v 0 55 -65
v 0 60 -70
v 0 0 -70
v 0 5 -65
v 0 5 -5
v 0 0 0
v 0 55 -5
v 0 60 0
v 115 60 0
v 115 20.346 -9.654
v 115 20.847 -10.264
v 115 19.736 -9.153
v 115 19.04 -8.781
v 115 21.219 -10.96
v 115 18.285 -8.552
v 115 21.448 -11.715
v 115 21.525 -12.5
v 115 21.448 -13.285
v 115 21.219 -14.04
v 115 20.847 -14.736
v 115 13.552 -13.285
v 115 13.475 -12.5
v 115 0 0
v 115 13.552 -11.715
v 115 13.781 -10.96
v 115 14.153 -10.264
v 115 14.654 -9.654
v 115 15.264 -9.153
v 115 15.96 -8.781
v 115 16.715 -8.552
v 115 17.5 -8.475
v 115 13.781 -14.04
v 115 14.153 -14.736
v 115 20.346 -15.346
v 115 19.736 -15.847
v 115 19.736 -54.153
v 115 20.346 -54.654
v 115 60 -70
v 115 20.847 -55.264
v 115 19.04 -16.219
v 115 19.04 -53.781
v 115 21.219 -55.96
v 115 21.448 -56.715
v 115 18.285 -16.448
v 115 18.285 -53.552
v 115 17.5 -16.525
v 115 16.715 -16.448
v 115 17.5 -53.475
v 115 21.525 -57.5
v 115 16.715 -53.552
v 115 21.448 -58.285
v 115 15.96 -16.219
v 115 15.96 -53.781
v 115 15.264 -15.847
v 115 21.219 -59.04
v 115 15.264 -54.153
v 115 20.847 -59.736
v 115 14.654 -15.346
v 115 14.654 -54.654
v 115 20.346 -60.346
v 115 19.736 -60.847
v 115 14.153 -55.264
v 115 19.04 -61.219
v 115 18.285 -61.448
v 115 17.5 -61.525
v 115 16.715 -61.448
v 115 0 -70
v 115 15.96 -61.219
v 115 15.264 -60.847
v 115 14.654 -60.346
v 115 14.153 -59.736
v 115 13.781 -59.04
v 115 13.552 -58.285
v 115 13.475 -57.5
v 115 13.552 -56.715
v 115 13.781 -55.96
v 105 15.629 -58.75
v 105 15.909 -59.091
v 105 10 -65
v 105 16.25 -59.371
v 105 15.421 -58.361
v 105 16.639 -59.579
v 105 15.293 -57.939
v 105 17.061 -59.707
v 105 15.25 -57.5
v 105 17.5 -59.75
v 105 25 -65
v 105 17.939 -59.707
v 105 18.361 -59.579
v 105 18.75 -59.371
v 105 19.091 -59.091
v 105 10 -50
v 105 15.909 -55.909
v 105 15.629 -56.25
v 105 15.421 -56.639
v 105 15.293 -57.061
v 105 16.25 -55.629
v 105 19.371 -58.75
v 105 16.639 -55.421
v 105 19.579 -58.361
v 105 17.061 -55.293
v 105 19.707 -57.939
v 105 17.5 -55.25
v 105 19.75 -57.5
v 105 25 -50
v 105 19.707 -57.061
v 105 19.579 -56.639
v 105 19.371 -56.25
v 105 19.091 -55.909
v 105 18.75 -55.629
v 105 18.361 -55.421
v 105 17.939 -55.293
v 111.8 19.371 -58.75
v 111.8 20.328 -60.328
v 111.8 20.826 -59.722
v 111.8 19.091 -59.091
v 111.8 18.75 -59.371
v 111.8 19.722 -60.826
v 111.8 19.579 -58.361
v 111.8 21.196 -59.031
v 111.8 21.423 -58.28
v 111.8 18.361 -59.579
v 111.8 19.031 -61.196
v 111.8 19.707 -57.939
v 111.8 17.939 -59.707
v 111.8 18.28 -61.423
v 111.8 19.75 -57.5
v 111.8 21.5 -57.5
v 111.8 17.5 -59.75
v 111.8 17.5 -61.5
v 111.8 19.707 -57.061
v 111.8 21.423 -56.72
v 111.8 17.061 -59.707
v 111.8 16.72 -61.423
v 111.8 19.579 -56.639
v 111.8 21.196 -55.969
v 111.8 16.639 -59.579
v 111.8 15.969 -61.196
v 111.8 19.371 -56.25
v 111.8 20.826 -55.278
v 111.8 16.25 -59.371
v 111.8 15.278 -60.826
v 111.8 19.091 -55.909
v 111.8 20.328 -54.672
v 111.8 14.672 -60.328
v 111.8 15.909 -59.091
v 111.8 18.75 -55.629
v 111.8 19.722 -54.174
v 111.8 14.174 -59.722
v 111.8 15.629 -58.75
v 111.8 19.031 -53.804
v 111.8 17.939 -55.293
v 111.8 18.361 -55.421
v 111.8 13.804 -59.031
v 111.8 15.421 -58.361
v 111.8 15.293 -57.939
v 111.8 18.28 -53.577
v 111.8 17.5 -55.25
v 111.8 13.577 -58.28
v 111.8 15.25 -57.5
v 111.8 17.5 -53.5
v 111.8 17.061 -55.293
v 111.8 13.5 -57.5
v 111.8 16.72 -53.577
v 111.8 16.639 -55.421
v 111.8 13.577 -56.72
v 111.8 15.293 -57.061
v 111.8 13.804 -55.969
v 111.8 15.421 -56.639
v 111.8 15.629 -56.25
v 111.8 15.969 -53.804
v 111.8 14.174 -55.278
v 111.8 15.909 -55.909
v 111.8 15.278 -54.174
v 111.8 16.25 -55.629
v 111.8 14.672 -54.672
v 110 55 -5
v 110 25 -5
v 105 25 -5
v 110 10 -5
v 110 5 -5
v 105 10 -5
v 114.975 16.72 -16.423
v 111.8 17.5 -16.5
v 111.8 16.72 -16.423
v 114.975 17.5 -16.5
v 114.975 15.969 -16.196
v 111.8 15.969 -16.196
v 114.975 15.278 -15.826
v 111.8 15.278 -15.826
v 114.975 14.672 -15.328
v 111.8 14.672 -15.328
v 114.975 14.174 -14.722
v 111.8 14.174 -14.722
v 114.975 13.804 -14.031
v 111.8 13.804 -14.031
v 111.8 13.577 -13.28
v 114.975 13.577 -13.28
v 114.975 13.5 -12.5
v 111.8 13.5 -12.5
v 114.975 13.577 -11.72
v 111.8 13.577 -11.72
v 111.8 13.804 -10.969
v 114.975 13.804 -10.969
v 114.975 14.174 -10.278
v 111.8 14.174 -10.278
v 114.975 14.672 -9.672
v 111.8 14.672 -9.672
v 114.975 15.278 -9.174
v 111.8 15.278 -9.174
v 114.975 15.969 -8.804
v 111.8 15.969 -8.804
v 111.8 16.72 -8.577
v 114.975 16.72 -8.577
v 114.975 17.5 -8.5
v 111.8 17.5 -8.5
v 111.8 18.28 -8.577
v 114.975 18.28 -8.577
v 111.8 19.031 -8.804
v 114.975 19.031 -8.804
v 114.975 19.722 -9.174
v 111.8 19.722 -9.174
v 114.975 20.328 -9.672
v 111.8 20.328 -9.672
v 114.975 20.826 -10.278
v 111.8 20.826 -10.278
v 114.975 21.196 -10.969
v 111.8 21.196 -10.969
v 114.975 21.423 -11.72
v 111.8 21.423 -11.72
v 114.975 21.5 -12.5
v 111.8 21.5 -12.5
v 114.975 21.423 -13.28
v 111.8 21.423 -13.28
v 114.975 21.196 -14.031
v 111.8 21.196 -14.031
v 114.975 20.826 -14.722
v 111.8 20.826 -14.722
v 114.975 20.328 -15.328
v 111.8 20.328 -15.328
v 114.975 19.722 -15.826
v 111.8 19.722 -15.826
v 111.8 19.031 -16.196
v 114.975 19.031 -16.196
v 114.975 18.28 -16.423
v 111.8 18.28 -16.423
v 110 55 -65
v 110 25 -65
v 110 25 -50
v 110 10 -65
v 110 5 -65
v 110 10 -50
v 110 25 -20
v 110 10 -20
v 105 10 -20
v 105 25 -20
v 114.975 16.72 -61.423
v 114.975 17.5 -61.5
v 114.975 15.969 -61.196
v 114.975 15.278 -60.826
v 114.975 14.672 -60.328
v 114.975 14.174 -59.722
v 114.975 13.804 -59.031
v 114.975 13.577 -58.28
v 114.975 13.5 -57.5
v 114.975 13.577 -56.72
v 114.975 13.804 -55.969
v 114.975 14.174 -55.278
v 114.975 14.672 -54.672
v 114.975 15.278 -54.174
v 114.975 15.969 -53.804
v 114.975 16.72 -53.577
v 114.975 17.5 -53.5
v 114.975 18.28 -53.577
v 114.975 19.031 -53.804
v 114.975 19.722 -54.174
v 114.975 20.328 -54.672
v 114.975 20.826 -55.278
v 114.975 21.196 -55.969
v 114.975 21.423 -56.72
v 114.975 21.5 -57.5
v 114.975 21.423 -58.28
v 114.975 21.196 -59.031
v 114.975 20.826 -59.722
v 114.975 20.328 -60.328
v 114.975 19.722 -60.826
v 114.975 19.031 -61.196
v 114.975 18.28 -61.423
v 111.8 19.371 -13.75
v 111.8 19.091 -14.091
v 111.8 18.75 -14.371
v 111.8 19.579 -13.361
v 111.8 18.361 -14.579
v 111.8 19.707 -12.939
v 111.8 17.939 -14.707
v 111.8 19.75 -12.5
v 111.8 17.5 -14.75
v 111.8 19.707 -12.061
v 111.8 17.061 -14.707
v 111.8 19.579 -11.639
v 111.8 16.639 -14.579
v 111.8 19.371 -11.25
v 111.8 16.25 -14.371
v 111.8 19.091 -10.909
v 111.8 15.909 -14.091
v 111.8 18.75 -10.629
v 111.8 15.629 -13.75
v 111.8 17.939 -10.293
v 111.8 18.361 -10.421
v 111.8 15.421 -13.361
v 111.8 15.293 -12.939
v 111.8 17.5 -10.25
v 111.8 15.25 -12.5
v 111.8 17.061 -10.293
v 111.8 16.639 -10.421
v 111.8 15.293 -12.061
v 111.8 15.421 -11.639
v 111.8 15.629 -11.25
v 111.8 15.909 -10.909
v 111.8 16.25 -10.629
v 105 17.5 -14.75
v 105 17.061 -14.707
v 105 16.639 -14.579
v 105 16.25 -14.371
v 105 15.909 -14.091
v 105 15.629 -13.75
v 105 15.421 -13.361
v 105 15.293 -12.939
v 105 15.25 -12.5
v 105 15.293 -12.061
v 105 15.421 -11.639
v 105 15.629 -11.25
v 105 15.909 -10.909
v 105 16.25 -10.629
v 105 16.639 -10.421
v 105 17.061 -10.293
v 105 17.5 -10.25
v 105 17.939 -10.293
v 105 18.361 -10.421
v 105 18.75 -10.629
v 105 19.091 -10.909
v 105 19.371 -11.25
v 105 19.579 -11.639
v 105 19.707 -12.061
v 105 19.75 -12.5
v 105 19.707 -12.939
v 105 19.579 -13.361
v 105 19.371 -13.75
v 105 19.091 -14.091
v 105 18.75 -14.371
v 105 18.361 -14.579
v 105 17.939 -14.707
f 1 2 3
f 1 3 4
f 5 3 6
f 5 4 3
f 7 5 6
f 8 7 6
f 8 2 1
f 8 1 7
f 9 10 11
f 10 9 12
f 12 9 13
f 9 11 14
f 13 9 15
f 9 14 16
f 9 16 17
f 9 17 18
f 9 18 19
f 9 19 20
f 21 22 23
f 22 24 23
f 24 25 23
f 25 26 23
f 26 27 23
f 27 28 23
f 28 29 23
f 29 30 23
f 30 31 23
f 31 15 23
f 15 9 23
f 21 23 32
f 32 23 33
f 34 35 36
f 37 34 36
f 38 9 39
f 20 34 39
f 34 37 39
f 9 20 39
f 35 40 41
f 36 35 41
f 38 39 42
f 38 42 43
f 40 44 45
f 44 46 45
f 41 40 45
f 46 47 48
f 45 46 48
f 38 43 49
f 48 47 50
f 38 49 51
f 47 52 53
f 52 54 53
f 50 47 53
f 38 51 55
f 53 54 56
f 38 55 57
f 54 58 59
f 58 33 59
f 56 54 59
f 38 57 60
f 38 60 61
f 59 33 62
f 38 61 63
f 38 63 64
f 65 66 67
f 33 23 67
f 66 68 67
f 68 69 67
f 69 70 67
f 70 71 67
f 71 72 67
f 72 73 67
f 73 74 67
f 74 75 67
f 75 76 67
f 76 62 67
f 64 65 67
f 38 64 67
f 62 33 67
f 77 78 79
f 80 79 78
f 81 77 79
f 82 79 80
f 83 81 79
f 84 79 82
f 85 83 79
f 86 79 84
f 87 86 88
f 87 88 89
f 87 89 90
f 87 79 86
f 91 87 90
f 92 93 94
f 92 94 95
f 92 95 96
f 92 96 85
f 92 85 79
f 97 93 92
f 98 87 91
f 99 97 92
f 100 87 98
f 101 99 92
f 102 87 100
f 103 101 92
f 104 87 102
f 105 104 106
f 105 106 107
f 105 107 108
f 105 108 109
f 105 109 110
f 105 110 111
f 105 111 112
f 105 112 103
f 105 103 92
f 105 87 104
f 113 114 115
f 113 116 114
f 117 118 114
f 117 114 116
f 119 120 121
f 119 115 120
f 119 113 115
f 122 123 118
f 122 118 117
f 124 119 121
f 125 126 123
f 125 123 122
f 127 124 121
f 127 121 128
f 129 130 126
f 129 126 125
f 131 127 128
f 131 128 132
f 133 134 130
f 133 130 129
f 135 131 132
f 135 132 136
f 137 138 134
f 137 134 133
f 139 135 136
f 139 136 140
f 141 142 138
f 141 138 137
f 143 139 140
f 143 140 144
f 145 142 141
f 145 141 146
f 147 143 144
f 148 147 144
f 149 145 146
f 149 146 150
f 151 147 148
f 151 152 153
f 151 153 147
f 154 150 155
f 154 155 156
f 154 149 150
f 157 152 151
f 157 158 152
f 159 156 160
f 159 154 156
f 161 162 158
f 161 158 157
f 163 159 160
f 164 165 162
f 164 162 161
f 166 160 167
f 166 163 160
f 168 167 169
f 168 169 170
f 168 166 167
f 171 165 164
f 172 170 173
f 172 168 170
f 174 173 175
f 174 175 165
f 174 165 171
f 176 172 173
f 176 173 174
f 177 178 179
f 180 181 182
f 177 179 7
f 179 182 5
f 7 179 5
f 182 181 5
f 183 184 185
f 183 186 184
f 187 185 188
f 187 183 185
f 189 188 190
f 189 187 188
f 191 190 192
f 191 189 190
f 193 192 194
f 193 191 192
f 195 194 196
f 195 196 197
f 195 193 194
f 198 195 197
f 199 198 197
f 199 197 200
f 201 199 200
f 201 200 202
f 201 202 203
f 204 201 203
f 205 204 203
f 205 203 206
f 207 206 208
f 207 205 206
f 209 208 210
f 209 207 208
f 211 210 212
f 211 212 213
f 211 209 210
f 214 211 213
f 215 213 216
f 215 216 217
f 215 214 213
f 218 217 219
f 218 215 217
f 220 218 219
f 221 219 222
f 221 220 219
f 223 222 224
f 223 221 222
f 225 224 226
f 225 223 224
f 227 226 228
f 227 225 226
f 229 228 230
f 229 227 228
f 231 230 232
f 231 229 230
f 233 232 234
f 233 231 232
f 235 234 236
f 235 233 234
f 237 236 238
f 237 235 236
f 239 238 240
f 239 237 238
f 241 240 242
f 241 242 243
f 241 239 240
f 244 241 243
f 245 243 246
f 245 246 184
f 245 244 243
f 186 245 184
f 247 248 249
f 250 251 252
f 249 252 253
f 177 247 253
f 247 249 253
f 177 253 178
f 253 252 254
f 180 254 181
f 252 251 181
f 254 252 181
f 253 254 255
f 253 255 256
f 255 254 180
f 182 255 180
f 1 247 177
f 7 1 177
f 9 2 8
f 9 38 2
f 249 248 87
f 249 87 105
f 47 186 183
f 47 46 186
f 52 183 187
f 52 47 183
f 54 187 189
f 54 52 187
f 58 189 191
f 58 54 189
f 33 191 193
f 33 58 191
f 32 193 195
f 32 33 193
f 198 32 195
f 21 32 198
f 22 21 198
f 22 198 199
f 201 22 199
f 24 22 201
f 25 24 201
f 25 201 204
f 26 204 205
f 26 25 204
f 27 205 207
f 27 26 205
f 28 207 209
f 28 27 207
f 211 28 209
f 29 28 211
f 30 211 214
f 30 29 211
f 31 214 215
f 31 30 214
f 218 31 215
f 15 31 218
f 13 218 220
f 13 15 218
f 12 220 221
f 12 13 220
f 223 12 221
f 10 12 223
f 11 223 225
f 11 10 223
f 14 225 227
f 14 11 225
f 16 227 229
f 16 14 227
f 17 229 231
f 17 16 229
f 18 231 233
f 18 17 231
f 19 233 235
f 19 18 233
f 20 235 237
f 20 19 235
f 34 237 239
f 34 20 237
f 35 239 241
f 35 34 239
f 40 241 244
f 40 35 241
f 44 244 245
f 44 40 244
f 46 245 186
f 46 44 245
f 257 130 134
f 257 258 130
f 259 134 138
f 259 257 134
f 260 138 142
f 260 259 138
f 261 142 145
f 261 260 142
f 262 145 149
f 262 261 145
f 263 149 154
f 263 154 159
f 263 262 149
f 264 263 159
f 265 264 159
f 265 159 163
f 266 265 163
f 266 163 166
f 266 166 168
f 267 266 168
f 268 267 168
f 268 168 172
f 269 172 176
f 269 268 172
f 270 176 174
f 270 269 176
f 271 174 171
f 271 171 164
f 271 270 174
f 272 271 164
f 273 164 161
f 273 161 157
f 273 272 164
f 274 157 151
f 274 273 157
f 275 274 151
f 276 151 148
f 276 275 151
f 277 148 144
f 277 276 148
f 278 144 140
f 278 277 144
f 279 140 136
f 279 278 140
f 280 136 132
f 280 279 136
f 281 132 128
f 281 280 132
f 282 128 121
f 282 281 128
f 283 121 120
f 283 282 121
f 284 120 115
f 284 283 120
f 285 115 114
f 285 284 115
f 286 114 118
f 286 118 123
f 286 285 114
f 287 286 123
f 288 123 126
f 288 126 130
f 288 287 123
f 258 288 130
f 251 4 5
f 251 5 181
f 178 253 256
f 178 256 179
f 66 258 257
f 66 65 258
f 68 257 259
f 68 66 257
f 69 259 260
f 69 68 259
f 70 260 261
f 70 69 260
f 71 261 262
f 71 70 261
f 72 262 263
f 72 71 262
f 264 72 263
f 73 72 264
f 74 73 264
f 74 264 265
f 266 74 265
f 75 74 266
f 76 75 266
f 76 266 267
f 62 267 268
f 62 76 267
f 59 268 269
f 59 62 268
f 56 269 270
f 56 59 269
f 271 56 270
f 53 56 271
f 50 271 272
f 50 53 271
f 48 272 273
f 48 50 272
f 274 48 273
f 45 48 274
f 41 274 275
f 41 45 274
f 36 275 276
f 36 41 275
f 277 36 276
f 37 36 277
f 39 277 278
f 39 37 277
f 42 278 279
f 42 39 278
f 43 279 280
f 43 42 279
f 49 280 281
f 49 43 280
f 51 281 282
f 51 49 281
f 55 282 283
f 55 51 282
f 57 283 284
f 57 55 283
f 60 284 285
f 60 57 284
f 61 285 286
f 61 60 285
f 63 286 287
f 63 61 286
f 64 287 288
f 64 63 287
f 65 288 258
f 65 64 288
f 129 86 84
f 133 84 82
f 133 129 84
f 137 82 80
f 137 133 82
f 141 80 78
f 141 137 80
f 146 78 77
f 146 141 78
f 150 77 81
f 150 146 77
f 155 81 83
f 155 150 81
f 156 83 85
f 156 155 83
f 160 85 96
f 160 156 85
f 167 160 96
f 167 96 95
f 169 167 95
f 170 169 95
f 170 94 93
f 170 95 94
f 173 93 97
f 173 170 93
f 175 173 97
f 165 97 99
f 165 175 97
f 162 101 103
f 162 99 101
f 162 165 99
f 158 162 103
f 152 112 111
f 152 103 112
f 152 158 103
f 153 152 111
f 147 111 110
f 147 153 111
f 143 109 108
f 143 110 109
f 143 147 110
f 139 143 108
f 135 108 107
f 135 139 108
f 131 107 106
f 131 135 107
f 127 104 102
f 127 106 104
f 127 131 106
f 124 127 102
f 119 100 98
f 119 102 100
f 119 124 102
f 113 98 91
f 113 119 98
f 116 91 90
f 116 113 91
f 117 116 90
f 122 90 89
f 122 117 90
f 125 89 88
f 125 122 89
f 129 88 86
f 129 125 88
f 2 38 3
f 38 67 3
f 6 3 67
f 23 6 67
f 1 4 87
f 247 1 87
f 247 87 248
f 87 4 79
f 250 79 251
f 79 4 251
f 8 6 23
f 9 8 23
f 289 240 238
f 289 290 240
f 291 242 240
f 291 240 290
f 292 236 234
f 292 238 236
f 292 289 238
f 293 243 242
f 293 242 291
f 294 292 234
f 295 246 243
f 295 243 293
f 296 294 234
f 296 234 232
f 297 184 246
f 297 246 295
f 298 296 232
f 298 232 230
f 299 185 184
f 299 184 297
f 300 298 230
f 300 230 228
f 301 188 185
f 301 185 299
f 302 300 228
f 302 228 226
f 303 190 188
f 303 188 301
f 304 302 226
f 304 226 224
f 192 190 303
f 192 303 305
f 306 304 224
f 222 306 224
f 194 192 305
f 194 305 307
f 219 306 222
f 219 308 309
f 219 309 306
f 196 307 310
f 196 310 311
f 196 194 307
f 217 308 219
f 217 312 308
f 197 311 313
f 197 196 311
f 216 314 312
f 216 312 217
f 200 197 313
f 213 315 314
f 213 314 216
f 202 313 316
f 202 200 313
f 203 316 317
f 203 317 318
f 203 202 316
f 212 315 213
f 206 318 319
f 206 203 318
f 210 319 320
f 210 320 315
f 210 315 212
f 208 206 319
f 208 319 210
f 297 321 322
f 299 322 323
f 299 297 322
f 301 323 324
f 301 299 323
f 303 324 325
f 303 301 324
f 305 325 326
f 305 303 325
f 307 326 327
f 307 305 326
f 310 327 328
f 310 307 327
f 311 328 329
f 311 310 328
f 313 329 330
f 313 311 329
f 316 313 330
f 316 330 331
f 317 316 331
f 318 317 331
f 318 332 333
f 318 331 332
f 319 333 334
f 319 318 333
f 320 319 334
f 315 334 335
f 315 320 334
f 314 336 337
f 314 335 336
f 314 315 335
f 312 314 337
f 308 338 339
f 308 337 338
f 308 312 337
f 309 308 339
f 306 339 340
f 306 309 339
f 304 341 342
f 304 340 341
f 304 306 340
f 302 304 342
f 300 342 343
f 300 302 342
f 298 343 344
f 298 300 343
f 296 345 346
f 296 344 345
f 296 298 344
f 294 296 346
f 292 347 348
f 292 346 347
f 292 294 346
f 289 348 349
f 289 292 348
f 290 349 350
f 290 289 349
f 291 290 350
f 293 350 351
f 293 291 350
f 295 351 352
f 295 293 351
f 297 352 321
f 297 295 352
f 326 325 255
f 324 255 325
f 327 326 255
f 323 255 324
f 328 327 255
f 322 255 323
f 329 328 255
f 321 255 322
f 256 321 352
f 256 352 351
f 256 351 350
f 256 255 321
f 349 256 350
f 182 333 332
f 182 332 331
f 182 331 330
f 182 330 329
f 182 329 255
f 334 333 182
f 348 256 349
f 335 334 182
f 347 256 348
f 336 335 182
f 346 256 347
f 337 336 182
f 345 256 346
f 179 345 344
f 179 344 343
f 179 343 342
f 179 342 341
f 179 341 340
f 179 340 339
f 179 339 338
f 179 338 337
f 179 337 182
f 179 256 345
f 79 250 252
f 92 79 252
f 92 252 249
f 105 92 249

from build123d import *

# Parameters (mm, degrees)
CROQUIS1_W                                  = 115
CROQUIS1_H                                  = 70
SALIENTE_EXTRUIR1_DEPTH                     = 5
SALIENTE_EXTRUIR2_DEPTH                     = 55
CROQUIS3_W                                  = 60
CROQUIS3_H                                  = 5
SALIENTE_EXTRUIR3_DEPTH                     = 110
CROQUIS4_W                                  = 15
CROQUIS4_H                                  = 15
SALIENTE_EXTRUIR4_DEPTH                     = 5
REFRENTADO_PARA_TORNILLO_CON_CABEZA_2_COUNT = 2
REFRENTADO_PARA_TORNILLO_CON_CABEZA_2_PITCH = 45


with BuildPart() as part:
    # Croquis1 → Saliente-Extruir1 (new body)
    with BuildSketch(Plane(origin=(0, 0, 0), x_dir=(1, 0, 0), z_dir=(0, 1, 0))):
        with Locations((57.5, 35)):
            Rectangle(CROQUIS1_W, CROQUIS1_H)
    extrude(amount=SALIENTE_EXTRUIR1_DEPTH)

    # Croquis2 → Saliente-Extruir2 (add)
    with BuildSketch(Plane(origin=(0, 5, 0), x_dir=(1, 0, 0), z_dir=(0, 1, 0))):
        Polygon((0, 0), (115, 0), (115, 70), (0, 70), (0, 65), (110, 65), (110, 5), (0, 5), align=None)
    extrude(amount=SALIENTE_EXTRUIR2_DEPTH)

    # Croquis3 → Saliente-Extruir3 (add)
    with BuildSketch(Plane.ZY.offset(-110)):
        with Locations((-35, 57.5)):
            Rectangle(CROQUIS3_W, CROQUIS3_H)
    extrude(amount=SALIENTE_EXTRUIR3_DEPTH)

    # Croquis4 → Saliente-Extruir4 (add)
    with BuildSketch(Plane.ZY.offset(-110)):
        with Locations((-57.5, 17.5)):
            Rectangle(CROQUIS4_W, CROQUIS4_H)
        with Locations((-12.5, 17.5)):
            Rectangle(CROQUIS4_W, CROQUIS4_H)
    extrude(amount=SALIENTE_EXTRUIR4_DEPTH)

    # Croquis7 → Refrentado para tornillo con cabeza hueca de M41 (revolve, cut)
    with BuildSketch(Plane(origin=(115, 17.5, -12.5), x_dir=(0, 0, -1), z_dir=(0, 1, 0))):
        Polygon((0, 0), (0, 21.851936393), (2.25, 20.5), (2.25, 3.2), (4, 3.2), (4, 0.025), (4.025, 0), align=None)
    refrentado_para_tornillo_con_cabeza_huec = revolve(axis=Axis((121.35, 17.5, -12.5), (-1, 0, 0)), mode=Mode.SUBTRACT)

    # Refrentado para tornillo con cabeza  2: Refrentado para tornillo con cabeza hueca de M41 ×2
    with Locations(*[(0, 0, -i * REFRENTADO_PARA_TORNILLO_CON_CABEZA_2_PITCH) for i in range(1, REFRENTADO_PARA_TORNILLO_CON_CABEZA_2_COUNT)]):
        add(refrentado_para_tornillo_con_cabeza_huec, mode=Mode.SUBTRACT)


solid = part.part
